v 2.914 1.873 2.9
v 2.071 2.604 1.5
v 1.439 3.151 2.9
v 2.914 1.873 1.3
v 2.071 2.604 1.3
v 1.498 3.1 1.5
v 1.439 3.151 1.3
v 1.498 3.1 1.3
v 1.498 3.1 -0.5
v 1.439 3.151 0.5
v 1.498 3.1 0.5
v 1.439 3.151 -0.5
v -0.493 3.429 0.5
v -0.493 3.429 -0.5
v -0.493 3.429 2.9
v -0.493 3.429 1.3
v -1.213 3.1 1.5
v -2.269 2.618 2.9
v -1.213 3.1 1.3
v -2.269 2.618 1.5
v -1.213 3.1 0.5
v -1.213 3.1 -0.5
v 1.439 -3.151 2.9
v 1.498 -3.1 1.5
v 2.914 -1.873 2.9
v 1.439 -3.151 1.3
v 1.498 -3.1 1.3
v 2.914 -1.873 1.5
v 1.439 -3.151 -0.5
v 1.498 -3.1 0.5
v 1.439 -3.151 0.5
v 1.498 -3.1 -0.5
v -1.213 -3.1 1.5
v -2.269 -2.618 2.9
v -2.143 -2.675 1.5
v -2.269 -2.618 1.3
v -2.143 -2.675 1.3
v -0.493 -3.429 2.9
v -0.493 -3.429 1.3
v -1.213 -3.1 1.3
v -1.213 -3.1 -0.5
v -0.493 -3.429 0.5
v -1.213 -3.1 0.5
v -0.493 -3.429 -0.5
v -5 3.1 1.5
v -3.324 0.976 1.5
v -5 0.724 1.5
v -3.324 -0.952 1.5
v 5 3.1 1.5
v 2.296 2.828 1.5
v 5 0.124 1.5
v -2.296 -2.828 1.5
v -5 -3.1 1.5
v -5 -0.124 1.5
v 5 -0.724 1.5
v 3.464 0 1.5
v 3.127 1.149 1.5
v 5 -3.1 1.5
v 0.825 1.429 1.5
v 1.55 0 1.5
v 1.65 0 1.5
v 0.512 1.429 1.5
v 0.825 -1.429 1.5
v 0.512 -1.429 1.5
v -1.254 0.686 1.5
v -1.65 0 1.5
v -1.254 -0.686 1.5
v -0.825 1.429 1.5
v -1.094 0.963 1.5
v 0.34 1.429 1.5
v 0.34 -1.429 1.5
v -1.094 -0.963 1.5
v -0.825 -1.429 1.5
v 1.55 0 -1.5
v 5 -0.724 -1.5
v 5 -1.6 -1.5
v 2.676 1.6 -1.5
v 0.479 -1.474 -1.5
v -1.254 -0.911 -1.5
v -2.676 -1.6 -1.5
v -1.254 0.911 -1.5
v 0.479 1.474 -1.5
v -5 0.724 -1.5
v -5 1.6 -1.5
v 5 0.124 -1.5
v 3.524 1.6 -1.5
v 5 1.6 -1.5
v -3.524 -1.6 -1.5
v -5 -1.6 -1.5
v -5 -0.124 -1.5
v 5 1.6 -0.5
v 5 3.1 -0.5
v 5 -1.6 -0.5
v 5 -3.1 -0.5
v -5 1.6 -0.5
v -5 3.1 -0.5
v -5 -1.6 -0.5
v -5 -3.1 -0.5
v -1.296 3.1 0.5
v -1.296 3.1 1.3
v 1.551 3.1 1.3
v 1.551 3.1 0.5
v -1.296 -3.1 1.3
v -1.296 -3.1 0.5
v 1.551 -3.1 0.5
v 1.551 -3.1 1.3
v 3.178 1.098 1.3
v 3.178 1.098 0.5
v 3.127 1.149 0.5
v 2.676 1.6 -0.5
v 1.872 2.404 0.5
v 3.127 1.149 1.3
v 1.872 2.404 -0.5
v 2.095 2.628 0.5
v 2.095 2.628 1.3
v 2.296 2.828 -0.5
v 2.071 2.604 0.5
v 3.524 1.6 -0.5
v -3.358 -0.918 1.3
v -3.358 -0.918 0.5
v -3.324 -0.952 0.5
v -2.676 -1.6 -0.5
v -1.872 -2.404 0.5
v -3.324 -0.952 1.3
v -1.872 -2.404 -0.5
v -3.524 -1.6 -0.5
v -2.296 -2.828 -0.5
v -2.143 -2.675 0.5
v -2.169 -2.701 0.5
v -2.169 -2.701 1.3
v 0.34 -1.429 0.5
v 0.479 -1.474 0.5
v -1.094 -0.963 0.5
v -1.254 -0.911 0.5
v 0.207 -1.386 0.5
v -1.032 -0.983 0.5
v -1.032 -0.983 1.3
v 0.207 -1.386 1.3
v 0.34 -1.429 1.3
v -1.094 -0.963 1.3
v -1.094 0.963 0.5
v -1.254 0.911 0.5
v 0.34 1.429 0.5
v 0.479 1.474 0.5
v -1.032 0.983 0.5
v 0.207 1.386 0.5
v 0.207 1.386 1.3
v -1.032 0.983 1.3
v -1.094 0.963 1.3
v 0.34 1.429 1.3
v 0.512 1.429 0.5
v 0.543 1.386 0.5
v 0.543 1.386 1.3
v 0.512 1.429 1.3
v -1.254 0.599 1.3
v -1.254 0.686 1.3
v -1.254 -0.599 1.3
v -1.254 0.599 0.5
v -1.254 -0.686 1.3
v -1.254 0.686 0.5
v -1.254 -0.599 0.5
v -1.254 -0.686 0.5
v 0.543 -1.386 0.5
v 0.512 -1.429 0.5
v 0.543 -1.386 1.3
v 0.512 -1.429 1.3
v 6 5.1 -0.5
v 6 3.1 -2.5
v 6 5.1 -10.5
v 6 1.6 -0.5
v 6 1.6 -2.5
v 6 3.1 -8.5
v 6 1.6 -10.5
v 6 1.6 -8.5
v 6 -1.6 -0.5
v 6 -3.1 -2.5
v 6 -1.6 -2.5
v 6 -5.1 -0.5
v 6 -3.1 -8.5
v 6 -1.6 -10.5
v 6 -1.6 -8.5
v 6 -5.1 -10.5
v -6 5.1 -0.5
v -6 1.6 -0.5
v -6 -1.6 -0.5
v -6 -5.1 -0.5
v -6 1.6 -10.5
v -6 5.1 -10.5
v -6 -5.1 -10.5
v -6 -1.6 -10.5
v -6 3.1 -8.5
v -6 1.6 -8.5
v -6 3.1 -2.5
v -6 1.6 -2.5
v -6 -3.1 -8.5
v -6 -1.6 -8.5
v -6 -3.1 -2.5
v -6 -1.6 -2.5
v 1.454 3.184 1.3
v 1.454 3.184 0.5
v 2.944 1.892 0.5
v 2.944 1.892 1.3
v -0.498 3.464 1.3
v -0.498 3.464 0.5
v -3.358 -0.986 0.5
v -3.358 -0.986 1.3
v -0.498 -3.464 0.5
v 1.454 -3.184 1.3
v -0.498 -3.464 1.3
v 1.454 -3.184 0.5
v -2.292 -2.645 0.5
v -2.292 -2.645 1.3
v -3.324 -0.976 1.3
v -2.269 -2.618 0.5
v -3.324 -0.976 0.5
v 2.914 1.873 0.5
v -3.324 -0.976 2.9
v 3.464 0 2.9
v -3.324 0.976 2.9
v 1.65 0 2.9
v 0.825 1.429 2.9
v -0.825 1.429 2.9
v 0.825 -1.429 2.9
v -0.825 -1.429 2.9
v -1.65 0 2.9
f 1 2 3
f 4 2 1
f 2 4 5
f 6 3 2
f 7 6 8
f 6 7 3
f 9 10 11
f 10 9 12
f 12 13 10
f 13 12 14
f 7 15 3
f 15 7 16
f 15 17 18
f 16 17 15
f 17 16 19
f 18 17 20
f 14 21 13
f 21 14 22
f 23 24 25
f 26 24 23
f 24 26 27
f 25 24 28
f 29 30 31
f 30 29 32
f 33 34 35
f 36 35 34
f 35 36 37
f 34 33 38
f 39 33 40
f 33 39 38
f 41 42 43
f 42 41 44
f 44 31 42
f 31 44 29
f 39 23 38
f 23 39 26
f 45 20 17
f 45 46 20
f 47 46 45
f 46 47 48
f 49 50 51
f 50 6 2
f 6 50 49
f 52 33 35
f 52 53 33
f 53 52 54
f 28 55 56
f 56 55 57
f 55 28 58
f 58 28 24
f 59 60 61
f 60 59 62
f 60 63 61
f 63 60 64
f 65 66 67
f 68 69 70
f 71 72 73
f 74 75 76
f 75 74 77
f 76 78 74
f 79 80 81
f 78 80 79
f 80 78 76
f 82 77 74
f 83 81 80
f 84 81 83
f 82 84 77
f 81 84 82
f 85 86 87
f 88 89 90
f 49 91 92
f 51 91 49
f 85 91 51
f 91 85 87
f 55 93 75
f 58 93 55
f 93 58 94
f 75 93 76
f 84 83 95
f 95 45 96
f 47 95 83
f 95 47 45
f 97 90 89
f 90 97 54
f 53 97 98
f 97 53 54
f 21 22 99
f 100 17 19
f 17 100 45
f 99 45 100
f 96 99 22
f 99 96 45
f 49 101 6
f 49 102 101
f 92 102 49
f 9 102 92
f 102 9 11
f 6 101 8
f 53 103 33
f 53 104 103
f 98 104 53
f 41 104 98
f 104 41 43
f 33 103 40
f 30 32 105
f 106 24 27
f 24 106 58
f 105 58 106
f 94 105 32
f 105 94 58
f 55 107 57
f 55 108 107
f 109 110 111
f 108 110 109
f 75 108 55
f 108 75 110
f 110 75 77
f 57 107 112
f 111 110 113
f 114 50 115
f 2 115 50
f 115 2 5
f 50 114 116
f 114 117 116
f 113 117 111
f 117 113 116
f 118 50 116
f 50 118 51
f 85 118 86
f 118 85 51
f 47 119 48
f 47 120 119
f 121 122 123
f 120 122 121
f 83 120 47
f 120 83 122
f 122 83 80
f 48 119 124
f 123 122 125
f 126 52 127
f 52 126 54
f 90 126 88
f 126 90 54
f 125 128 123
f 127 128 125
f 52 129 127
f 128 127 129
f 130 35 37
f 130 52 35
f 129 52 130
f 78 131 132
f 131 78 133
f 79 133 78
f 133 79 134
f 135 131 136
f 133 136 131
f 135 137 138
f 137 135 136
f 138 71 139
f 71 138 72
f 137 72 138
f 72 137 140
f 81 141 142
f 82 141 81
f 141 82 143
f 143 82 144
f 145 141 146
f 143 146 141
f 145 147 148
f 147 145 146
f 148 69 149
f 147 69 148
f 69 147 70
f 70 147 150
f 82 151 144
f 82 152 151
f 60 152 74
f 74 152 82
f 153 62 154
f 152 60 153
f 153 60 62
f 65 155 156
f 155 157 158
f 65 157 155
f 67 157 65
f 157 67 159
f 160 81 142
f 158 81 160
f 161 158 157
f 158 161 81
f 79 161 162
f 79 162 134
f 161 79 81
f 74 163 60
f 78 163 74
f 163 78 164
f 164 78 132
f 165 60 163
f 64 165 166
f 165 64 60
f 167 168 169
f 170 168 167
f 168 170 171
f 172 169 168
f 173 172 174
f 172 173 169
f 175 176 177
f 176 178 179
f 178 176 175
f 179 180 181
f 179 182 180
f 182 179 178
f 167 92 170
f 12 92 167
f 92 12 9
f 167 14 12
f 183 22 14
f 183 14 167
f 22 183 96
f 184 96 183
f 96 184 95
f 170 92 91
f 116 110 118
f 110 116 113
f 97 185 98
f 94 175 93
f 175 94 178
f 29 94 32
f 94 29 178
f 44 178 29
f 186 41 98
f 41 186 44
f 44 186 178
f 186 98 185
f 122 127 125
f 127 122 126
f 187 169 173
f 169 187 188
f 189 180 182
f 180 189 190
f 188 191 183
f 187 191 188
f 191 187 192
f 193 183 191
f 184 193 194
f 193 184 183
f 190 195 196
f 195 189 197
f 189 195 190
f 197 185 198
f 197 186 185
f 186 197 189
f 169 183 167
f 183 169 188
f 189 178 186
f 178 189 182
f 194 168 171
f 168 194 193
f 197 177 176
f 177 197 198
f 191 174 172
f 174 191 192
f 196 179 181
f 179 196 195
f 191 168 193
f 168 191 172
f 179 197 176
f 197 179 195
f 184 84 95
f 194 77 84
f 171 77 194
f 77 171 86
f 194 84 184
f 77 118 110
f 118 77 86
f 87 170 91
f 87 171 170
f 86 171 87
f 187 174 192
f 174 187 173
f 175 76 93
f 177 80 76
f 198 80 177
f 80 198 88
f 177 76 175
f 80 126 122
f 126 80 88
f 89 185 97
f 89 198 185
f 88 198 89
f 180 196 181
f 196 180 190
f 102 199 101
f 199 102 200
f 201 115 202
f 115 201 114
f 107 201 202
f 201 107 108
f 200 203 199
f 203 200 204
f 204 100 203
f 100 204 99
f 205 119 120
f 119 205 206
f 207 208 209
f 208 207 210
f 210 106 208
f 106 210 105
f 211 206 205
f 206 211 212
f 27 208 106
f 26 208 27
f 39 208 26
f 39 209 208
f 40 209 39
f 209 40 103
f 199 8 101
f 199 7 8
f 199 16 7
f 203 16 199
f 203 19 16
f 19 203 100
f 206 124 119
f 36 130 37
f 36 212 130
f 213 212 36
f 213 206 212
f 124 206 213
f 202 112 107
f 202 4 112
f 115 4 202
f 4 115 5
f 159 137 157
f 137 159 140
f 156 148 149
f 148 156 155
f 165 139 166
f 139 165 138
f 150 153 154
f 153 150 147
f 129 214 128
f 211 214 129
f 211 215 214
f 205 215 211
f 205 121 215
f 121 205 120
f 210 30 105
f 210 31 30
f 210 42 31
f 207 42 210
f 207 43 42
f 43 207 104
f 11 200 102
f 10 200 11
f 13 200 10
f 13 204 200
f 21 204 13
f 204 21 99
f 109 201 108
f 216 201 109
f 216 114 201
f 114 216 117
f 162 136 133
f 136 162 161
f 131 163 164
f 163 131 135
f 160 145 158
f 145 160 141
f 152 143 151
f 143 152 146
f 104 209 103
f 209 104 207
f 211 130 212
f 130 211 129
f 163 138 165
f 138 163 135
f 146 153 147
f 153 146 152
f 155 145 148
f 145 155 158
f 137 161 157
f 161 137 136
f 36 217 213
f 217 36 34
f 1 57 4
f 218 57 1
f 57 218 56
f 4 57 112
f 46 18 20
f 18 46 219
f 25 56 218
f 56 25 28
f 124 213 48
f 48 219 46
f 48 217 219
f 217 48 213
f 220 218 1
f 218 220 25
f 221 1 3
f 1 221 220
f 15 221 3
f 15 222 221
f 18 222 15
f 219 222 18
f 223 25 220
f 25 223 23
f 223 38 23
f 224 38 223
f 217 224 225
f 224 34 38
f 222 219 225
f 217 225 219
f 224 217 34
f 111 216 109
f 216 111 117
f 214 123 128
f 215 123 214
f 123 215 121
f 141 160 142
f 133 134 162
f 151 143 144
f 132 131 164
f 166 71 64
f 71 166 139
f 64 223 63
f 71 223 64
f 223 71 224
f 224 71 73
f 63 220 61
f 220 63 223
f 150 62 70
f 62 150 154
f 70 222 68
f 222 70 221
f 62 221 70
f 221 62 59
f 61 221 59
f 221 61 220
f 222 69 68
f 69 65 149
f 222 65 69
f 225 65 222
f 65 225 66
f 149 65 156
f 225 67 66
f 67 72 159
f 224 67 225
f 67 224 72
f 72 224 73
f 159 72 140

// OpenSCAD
// Parameters
screw_diameter = 3.0; //[1.5:6.0:0.1]
thread_pitch = 0.5; //[0.25:1.0:0.05]
across_flats = 6.0; //[3.0:12.0:0.1]
thickness = 3.0; //[1.5:6.0:0.1]
body_length = 10.0; //[5.0:20.0:0.5]
body_width = 6.2; //[3.5:12.0:0.1]
tolerance_general = 0.1; //[0.05:0.3:0.01]
corner_chamfer = 0.3; //[0.0:1.0:0.05]
edge_fillet_radius = 0.2; //[0.0:1.0:0.05]
thread_tap_drill_diameter = 2.5; //[1.5:4.0:0.1]
clearance_hole_diameter = 3.2; //[3.0:4.5:0.1]
hole_style_selector = 0; //[0:2:1]
hole_diameter_threaded = 3.0; //[2.5:3.5:0.05]
hole_diameter = 3.0; //[2.0:4.5:0.05]
hole_extra_height = 2.0; //[1.0:6.0:0.5]
overlap = 1.0; //[0.5:2.0:0.1]
anti_rotation_nib_height = 0.6; //[0.3:1.5:0.1]
anti_rotation_nib_length = 4.0; //[2.0:8.0:0.5]
anti_rotation_nib_thickness = 2.0; //[1.0:3.0:0.1]
t_slot_nominal_width = 6.0; //[4.0:10.0:0.1]
slot_entry_width = 3.2; //[2.0:6.0:0.1]
slot_undercut_width = 6.2; //[4.0:10.0:0.1]
slot_depth = 6.0; //[3.0:12.0:0.1]
t_slot_profile_length = 12.0; //[6.0:30.0:1]
t_slot_profile_wall = 2.0; //[1.0:5.0:0.1]
include_reference_nut_and_washer = 1; //[0:1:1]
ref_nut_thickness = 2.4; //[1.2:5.0:0.1]
ref_washer_thickness = 0.8; //[0.4:2.0:0.1]
ref_washer_od = 7.0; //[5.0:14.0:0.1]
ref_washer_id = 3.2; //[3.0:5.0:0.1]

// Nut and Washer - complete geometry
module nut_and_washer() {
  color("Silver") {
    // Washer
    difference() {
      cylinder(r=ref_washer_od/2, h=ref_washer_thickness, center=true);
      translate([0, 0, 0])
        cylinder(r=ref_washer_id/2, h=ref_washer_thickness + overlap*2, center=true);
    }
    // Nut
    translate([0, 0, ref_washer_thickness]) {
      difference() {
        cylinder(r=across_flats/(2*cos(30)), h=ref_nut_thickness, center=true);
        translate([0, 0, 0])
          cylinder(r=(clearance_hole_diameter/2) + tolerance_general/2, h=ref_nut_thickness + overlap*2, center=true);
      }
    }
  }
}

// T-slot nut body
module t_slot_nut_body() {
  color("DimGray") {
    difference() {
      union() {
        // Hex body
        cylinder(r=across_flats/(2*cos(30)), h=thickness, center=true);
        // Length box
        cube([body_length, body_width, thickness], center=true);
        // Anti-rotation nibs
        translate([0, body_width/2 + anti_rotation_nib_height/2 - overlap, 0])
          cube([anti_rotation_nib_length, anti_rotation_nib_height, min(anti_rotation_nib_thickness, thickness)], center=true);
        translate([0, -(body_width/2 + anti_rotation_nib_height/2 - overlap), 0])
          cube([anti_rotation_nib_length, anti_rotation_nib_height, min(anti_rotation_nib_thickness, thickness)], center=true);
      }
      // Lead-in chamfers
      translate([body_length/2 - corner_chamfer, 0, 0])
        rotate([0, 0, 45])
        cube([corner_chamfer*2, body_width + anti_rotation_nib_height*2, thickness + overlap*2], center=true);
      translate([-(body_length/2 - corner_chamfer), 0, 0])
        rotate([0, 0, 45])
        cube([corner_chamfer*2, body_width + anti_rotation_nib_height*2, thickness + overlap*2], center=true);
      // Threaded hole
      translate([0, 0, 0])
        cylinder(r=(hole_diameter/2) + tolerance_general/2, h=thickness + hole_extra_height, center=true);
    }
  }
}

// T-slot profile
module t_slot_profile() {
  color("Black") {
    difference() {
      // Outer profile
      cube([t_slot_profile_length, slot_undercut_width + 2*t_slot_profile_wall, slot_depth + 2*t_slot_profile_wall], center=true);
      // Inner void
      translate([0, 0, 0])
        cube([t_slot_profile_length + overlap*2, slot_undercut_width, slot_depth], center=true);
      // Entry void
      translate([0, 0, 0])
        cube([t_slot_profile_length + overlap*2, slot_entry_width, slot_depth + 2*t_slot_profile_wall + overlap*2], center=true);
    }
  }
}

// Assembly
module assembly() {
  t_slot_nut_body();
  translate([0, 0, -(thickness/2 + (slot_depth + 2*t_slot_profile_wall)/2 - overlap)])
    t_slot_profile();
  if (include_reference_nut_and_washer) {
    translate([0, 0, thickness/2 + ref_washer_thickness/2 - overlap])
      nut_and_washer();
  }
}

assembly();
